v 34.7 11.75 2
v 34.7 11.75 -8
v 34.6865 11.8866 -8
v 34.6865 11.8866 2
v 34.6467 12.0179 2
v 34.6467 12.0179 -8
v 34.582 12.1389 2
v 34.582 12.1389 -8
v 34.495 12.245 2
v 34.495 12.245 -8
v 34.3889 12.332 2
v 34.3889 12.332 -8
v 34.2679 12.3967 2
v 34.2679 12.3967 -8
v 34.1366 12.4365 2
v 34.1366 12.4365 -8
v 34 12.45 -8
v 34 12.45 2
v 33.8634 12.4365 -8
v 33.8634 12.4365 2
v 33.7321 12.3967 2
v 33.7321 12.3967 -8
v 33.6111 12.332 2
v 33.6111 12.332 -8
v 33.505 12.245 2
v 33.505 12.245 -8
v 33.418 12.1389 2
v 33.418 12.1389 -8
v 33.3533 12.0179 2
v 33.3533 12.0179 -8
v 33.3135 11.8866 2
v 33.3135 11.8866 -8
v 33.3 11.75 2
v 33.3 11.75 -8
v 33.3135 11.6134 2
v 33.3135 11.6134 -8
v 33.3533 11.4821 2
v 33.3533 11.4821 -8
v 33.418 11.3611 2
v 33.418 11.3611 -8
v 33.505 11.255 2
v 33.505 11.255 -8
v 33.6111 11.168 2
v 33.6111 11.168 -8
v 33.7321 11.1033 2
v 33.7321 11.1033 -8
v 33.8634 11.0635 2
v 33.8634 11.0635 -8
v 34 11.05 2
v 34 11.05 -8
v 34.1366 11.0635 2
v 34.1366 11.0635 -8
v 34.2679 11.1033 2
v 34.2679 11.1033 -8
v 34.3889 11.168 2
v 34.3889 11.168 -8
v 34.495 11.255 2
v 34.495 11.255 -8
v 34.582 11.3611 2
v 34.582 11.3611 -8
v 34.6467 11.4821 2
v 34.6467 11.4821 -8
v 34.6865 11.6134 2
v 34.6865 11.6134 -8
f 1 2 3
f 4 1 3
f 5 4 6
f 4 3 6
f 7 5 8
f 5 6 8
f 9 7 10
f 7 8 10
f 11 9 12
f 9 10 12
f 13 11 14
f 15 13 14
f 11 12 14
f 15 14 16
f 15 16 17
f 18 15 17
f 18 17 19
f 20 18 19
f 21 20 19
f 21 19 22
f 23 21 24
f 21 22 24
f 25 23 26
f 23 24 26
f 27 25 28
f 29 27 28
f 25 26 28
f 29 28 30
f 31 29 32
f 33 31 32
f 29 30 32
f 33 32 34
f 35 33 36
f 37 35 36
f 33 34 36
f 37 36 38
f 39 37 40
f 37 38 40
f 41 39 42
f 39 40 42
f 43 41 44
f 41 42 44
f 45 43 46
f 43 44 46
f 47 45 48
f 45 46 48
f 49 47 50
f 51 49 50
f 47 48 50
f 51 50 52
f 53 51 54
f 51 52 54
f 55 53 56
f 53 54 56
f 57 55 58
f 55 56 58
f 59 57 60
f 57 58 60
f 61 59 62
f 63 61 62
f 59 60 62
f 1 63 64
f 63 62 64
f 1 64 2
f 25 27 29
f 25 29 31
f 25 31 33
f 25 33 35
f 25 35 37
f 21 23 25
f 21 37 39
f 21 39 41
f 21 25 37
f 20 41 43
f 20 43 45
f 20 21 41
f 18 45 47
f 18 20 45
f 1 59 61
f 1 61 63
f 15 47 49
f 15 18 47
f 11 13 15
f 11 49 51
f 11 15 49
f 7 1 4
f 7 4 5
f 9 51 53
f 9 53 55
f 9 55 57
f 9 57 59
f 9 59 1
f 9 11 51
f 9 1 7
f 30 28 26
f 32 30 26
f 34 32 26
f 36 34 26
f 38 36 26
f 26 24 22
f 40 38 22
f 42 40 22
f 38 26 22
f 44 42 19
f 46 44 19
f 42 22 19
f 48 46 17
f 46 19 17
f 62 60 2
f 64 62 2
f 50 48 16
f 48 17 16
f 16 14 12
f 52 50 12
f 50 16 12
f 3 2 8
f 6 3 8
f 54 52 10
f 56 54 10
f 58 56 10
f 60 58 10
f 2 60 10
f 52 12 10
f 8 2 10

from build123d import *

# Parameters (mm, degrees)
CYLINDER_R     = 0.7
CYLINDER_DEPTH = 10


with BuildPart() as cilindro:
    # Cylinder → Cylinder (new body)
    with BuildSketch(Plane(origin=(3, 5.25, -8), x_dir=(1, 0, 0), z_dir=(0, 0, 1))):
        Circle(CYLINDER_R)
    extrude(amount=CYLINDER_DEPTH)


with BuildPart() as part_mirroring:
    # Part__Mirroring: instance of Cilindro
    add(cilindro.part.mirror(Plane(origin=(0, 0, 0), x_dir=(0, 1, 0), z_dir=(0, 0, 1))))


with BuildPart() as part_mirroring_1:
    # Part__Mirroring placement: moved
    add(part_mirroring.part.moved(Location((0, 6.5, -6))))


with BuildPart() as part_mirroring001:
    # Part__Mirroring001: instance of Part__Mirroring
    add(part_mirroring_1.part.mirror(Plane(origin=(0, 0, 0), x_dir=(0, 1, 0), z_dir=(0, 0, 1))))


with BuildPart() as part_mirroring001_1:
    # Part__Mirroring001 placement: moved
    add(part_mirroring001.part.moved(Location((31, 0, -6))))


solid = part_mirroring001_1.part
